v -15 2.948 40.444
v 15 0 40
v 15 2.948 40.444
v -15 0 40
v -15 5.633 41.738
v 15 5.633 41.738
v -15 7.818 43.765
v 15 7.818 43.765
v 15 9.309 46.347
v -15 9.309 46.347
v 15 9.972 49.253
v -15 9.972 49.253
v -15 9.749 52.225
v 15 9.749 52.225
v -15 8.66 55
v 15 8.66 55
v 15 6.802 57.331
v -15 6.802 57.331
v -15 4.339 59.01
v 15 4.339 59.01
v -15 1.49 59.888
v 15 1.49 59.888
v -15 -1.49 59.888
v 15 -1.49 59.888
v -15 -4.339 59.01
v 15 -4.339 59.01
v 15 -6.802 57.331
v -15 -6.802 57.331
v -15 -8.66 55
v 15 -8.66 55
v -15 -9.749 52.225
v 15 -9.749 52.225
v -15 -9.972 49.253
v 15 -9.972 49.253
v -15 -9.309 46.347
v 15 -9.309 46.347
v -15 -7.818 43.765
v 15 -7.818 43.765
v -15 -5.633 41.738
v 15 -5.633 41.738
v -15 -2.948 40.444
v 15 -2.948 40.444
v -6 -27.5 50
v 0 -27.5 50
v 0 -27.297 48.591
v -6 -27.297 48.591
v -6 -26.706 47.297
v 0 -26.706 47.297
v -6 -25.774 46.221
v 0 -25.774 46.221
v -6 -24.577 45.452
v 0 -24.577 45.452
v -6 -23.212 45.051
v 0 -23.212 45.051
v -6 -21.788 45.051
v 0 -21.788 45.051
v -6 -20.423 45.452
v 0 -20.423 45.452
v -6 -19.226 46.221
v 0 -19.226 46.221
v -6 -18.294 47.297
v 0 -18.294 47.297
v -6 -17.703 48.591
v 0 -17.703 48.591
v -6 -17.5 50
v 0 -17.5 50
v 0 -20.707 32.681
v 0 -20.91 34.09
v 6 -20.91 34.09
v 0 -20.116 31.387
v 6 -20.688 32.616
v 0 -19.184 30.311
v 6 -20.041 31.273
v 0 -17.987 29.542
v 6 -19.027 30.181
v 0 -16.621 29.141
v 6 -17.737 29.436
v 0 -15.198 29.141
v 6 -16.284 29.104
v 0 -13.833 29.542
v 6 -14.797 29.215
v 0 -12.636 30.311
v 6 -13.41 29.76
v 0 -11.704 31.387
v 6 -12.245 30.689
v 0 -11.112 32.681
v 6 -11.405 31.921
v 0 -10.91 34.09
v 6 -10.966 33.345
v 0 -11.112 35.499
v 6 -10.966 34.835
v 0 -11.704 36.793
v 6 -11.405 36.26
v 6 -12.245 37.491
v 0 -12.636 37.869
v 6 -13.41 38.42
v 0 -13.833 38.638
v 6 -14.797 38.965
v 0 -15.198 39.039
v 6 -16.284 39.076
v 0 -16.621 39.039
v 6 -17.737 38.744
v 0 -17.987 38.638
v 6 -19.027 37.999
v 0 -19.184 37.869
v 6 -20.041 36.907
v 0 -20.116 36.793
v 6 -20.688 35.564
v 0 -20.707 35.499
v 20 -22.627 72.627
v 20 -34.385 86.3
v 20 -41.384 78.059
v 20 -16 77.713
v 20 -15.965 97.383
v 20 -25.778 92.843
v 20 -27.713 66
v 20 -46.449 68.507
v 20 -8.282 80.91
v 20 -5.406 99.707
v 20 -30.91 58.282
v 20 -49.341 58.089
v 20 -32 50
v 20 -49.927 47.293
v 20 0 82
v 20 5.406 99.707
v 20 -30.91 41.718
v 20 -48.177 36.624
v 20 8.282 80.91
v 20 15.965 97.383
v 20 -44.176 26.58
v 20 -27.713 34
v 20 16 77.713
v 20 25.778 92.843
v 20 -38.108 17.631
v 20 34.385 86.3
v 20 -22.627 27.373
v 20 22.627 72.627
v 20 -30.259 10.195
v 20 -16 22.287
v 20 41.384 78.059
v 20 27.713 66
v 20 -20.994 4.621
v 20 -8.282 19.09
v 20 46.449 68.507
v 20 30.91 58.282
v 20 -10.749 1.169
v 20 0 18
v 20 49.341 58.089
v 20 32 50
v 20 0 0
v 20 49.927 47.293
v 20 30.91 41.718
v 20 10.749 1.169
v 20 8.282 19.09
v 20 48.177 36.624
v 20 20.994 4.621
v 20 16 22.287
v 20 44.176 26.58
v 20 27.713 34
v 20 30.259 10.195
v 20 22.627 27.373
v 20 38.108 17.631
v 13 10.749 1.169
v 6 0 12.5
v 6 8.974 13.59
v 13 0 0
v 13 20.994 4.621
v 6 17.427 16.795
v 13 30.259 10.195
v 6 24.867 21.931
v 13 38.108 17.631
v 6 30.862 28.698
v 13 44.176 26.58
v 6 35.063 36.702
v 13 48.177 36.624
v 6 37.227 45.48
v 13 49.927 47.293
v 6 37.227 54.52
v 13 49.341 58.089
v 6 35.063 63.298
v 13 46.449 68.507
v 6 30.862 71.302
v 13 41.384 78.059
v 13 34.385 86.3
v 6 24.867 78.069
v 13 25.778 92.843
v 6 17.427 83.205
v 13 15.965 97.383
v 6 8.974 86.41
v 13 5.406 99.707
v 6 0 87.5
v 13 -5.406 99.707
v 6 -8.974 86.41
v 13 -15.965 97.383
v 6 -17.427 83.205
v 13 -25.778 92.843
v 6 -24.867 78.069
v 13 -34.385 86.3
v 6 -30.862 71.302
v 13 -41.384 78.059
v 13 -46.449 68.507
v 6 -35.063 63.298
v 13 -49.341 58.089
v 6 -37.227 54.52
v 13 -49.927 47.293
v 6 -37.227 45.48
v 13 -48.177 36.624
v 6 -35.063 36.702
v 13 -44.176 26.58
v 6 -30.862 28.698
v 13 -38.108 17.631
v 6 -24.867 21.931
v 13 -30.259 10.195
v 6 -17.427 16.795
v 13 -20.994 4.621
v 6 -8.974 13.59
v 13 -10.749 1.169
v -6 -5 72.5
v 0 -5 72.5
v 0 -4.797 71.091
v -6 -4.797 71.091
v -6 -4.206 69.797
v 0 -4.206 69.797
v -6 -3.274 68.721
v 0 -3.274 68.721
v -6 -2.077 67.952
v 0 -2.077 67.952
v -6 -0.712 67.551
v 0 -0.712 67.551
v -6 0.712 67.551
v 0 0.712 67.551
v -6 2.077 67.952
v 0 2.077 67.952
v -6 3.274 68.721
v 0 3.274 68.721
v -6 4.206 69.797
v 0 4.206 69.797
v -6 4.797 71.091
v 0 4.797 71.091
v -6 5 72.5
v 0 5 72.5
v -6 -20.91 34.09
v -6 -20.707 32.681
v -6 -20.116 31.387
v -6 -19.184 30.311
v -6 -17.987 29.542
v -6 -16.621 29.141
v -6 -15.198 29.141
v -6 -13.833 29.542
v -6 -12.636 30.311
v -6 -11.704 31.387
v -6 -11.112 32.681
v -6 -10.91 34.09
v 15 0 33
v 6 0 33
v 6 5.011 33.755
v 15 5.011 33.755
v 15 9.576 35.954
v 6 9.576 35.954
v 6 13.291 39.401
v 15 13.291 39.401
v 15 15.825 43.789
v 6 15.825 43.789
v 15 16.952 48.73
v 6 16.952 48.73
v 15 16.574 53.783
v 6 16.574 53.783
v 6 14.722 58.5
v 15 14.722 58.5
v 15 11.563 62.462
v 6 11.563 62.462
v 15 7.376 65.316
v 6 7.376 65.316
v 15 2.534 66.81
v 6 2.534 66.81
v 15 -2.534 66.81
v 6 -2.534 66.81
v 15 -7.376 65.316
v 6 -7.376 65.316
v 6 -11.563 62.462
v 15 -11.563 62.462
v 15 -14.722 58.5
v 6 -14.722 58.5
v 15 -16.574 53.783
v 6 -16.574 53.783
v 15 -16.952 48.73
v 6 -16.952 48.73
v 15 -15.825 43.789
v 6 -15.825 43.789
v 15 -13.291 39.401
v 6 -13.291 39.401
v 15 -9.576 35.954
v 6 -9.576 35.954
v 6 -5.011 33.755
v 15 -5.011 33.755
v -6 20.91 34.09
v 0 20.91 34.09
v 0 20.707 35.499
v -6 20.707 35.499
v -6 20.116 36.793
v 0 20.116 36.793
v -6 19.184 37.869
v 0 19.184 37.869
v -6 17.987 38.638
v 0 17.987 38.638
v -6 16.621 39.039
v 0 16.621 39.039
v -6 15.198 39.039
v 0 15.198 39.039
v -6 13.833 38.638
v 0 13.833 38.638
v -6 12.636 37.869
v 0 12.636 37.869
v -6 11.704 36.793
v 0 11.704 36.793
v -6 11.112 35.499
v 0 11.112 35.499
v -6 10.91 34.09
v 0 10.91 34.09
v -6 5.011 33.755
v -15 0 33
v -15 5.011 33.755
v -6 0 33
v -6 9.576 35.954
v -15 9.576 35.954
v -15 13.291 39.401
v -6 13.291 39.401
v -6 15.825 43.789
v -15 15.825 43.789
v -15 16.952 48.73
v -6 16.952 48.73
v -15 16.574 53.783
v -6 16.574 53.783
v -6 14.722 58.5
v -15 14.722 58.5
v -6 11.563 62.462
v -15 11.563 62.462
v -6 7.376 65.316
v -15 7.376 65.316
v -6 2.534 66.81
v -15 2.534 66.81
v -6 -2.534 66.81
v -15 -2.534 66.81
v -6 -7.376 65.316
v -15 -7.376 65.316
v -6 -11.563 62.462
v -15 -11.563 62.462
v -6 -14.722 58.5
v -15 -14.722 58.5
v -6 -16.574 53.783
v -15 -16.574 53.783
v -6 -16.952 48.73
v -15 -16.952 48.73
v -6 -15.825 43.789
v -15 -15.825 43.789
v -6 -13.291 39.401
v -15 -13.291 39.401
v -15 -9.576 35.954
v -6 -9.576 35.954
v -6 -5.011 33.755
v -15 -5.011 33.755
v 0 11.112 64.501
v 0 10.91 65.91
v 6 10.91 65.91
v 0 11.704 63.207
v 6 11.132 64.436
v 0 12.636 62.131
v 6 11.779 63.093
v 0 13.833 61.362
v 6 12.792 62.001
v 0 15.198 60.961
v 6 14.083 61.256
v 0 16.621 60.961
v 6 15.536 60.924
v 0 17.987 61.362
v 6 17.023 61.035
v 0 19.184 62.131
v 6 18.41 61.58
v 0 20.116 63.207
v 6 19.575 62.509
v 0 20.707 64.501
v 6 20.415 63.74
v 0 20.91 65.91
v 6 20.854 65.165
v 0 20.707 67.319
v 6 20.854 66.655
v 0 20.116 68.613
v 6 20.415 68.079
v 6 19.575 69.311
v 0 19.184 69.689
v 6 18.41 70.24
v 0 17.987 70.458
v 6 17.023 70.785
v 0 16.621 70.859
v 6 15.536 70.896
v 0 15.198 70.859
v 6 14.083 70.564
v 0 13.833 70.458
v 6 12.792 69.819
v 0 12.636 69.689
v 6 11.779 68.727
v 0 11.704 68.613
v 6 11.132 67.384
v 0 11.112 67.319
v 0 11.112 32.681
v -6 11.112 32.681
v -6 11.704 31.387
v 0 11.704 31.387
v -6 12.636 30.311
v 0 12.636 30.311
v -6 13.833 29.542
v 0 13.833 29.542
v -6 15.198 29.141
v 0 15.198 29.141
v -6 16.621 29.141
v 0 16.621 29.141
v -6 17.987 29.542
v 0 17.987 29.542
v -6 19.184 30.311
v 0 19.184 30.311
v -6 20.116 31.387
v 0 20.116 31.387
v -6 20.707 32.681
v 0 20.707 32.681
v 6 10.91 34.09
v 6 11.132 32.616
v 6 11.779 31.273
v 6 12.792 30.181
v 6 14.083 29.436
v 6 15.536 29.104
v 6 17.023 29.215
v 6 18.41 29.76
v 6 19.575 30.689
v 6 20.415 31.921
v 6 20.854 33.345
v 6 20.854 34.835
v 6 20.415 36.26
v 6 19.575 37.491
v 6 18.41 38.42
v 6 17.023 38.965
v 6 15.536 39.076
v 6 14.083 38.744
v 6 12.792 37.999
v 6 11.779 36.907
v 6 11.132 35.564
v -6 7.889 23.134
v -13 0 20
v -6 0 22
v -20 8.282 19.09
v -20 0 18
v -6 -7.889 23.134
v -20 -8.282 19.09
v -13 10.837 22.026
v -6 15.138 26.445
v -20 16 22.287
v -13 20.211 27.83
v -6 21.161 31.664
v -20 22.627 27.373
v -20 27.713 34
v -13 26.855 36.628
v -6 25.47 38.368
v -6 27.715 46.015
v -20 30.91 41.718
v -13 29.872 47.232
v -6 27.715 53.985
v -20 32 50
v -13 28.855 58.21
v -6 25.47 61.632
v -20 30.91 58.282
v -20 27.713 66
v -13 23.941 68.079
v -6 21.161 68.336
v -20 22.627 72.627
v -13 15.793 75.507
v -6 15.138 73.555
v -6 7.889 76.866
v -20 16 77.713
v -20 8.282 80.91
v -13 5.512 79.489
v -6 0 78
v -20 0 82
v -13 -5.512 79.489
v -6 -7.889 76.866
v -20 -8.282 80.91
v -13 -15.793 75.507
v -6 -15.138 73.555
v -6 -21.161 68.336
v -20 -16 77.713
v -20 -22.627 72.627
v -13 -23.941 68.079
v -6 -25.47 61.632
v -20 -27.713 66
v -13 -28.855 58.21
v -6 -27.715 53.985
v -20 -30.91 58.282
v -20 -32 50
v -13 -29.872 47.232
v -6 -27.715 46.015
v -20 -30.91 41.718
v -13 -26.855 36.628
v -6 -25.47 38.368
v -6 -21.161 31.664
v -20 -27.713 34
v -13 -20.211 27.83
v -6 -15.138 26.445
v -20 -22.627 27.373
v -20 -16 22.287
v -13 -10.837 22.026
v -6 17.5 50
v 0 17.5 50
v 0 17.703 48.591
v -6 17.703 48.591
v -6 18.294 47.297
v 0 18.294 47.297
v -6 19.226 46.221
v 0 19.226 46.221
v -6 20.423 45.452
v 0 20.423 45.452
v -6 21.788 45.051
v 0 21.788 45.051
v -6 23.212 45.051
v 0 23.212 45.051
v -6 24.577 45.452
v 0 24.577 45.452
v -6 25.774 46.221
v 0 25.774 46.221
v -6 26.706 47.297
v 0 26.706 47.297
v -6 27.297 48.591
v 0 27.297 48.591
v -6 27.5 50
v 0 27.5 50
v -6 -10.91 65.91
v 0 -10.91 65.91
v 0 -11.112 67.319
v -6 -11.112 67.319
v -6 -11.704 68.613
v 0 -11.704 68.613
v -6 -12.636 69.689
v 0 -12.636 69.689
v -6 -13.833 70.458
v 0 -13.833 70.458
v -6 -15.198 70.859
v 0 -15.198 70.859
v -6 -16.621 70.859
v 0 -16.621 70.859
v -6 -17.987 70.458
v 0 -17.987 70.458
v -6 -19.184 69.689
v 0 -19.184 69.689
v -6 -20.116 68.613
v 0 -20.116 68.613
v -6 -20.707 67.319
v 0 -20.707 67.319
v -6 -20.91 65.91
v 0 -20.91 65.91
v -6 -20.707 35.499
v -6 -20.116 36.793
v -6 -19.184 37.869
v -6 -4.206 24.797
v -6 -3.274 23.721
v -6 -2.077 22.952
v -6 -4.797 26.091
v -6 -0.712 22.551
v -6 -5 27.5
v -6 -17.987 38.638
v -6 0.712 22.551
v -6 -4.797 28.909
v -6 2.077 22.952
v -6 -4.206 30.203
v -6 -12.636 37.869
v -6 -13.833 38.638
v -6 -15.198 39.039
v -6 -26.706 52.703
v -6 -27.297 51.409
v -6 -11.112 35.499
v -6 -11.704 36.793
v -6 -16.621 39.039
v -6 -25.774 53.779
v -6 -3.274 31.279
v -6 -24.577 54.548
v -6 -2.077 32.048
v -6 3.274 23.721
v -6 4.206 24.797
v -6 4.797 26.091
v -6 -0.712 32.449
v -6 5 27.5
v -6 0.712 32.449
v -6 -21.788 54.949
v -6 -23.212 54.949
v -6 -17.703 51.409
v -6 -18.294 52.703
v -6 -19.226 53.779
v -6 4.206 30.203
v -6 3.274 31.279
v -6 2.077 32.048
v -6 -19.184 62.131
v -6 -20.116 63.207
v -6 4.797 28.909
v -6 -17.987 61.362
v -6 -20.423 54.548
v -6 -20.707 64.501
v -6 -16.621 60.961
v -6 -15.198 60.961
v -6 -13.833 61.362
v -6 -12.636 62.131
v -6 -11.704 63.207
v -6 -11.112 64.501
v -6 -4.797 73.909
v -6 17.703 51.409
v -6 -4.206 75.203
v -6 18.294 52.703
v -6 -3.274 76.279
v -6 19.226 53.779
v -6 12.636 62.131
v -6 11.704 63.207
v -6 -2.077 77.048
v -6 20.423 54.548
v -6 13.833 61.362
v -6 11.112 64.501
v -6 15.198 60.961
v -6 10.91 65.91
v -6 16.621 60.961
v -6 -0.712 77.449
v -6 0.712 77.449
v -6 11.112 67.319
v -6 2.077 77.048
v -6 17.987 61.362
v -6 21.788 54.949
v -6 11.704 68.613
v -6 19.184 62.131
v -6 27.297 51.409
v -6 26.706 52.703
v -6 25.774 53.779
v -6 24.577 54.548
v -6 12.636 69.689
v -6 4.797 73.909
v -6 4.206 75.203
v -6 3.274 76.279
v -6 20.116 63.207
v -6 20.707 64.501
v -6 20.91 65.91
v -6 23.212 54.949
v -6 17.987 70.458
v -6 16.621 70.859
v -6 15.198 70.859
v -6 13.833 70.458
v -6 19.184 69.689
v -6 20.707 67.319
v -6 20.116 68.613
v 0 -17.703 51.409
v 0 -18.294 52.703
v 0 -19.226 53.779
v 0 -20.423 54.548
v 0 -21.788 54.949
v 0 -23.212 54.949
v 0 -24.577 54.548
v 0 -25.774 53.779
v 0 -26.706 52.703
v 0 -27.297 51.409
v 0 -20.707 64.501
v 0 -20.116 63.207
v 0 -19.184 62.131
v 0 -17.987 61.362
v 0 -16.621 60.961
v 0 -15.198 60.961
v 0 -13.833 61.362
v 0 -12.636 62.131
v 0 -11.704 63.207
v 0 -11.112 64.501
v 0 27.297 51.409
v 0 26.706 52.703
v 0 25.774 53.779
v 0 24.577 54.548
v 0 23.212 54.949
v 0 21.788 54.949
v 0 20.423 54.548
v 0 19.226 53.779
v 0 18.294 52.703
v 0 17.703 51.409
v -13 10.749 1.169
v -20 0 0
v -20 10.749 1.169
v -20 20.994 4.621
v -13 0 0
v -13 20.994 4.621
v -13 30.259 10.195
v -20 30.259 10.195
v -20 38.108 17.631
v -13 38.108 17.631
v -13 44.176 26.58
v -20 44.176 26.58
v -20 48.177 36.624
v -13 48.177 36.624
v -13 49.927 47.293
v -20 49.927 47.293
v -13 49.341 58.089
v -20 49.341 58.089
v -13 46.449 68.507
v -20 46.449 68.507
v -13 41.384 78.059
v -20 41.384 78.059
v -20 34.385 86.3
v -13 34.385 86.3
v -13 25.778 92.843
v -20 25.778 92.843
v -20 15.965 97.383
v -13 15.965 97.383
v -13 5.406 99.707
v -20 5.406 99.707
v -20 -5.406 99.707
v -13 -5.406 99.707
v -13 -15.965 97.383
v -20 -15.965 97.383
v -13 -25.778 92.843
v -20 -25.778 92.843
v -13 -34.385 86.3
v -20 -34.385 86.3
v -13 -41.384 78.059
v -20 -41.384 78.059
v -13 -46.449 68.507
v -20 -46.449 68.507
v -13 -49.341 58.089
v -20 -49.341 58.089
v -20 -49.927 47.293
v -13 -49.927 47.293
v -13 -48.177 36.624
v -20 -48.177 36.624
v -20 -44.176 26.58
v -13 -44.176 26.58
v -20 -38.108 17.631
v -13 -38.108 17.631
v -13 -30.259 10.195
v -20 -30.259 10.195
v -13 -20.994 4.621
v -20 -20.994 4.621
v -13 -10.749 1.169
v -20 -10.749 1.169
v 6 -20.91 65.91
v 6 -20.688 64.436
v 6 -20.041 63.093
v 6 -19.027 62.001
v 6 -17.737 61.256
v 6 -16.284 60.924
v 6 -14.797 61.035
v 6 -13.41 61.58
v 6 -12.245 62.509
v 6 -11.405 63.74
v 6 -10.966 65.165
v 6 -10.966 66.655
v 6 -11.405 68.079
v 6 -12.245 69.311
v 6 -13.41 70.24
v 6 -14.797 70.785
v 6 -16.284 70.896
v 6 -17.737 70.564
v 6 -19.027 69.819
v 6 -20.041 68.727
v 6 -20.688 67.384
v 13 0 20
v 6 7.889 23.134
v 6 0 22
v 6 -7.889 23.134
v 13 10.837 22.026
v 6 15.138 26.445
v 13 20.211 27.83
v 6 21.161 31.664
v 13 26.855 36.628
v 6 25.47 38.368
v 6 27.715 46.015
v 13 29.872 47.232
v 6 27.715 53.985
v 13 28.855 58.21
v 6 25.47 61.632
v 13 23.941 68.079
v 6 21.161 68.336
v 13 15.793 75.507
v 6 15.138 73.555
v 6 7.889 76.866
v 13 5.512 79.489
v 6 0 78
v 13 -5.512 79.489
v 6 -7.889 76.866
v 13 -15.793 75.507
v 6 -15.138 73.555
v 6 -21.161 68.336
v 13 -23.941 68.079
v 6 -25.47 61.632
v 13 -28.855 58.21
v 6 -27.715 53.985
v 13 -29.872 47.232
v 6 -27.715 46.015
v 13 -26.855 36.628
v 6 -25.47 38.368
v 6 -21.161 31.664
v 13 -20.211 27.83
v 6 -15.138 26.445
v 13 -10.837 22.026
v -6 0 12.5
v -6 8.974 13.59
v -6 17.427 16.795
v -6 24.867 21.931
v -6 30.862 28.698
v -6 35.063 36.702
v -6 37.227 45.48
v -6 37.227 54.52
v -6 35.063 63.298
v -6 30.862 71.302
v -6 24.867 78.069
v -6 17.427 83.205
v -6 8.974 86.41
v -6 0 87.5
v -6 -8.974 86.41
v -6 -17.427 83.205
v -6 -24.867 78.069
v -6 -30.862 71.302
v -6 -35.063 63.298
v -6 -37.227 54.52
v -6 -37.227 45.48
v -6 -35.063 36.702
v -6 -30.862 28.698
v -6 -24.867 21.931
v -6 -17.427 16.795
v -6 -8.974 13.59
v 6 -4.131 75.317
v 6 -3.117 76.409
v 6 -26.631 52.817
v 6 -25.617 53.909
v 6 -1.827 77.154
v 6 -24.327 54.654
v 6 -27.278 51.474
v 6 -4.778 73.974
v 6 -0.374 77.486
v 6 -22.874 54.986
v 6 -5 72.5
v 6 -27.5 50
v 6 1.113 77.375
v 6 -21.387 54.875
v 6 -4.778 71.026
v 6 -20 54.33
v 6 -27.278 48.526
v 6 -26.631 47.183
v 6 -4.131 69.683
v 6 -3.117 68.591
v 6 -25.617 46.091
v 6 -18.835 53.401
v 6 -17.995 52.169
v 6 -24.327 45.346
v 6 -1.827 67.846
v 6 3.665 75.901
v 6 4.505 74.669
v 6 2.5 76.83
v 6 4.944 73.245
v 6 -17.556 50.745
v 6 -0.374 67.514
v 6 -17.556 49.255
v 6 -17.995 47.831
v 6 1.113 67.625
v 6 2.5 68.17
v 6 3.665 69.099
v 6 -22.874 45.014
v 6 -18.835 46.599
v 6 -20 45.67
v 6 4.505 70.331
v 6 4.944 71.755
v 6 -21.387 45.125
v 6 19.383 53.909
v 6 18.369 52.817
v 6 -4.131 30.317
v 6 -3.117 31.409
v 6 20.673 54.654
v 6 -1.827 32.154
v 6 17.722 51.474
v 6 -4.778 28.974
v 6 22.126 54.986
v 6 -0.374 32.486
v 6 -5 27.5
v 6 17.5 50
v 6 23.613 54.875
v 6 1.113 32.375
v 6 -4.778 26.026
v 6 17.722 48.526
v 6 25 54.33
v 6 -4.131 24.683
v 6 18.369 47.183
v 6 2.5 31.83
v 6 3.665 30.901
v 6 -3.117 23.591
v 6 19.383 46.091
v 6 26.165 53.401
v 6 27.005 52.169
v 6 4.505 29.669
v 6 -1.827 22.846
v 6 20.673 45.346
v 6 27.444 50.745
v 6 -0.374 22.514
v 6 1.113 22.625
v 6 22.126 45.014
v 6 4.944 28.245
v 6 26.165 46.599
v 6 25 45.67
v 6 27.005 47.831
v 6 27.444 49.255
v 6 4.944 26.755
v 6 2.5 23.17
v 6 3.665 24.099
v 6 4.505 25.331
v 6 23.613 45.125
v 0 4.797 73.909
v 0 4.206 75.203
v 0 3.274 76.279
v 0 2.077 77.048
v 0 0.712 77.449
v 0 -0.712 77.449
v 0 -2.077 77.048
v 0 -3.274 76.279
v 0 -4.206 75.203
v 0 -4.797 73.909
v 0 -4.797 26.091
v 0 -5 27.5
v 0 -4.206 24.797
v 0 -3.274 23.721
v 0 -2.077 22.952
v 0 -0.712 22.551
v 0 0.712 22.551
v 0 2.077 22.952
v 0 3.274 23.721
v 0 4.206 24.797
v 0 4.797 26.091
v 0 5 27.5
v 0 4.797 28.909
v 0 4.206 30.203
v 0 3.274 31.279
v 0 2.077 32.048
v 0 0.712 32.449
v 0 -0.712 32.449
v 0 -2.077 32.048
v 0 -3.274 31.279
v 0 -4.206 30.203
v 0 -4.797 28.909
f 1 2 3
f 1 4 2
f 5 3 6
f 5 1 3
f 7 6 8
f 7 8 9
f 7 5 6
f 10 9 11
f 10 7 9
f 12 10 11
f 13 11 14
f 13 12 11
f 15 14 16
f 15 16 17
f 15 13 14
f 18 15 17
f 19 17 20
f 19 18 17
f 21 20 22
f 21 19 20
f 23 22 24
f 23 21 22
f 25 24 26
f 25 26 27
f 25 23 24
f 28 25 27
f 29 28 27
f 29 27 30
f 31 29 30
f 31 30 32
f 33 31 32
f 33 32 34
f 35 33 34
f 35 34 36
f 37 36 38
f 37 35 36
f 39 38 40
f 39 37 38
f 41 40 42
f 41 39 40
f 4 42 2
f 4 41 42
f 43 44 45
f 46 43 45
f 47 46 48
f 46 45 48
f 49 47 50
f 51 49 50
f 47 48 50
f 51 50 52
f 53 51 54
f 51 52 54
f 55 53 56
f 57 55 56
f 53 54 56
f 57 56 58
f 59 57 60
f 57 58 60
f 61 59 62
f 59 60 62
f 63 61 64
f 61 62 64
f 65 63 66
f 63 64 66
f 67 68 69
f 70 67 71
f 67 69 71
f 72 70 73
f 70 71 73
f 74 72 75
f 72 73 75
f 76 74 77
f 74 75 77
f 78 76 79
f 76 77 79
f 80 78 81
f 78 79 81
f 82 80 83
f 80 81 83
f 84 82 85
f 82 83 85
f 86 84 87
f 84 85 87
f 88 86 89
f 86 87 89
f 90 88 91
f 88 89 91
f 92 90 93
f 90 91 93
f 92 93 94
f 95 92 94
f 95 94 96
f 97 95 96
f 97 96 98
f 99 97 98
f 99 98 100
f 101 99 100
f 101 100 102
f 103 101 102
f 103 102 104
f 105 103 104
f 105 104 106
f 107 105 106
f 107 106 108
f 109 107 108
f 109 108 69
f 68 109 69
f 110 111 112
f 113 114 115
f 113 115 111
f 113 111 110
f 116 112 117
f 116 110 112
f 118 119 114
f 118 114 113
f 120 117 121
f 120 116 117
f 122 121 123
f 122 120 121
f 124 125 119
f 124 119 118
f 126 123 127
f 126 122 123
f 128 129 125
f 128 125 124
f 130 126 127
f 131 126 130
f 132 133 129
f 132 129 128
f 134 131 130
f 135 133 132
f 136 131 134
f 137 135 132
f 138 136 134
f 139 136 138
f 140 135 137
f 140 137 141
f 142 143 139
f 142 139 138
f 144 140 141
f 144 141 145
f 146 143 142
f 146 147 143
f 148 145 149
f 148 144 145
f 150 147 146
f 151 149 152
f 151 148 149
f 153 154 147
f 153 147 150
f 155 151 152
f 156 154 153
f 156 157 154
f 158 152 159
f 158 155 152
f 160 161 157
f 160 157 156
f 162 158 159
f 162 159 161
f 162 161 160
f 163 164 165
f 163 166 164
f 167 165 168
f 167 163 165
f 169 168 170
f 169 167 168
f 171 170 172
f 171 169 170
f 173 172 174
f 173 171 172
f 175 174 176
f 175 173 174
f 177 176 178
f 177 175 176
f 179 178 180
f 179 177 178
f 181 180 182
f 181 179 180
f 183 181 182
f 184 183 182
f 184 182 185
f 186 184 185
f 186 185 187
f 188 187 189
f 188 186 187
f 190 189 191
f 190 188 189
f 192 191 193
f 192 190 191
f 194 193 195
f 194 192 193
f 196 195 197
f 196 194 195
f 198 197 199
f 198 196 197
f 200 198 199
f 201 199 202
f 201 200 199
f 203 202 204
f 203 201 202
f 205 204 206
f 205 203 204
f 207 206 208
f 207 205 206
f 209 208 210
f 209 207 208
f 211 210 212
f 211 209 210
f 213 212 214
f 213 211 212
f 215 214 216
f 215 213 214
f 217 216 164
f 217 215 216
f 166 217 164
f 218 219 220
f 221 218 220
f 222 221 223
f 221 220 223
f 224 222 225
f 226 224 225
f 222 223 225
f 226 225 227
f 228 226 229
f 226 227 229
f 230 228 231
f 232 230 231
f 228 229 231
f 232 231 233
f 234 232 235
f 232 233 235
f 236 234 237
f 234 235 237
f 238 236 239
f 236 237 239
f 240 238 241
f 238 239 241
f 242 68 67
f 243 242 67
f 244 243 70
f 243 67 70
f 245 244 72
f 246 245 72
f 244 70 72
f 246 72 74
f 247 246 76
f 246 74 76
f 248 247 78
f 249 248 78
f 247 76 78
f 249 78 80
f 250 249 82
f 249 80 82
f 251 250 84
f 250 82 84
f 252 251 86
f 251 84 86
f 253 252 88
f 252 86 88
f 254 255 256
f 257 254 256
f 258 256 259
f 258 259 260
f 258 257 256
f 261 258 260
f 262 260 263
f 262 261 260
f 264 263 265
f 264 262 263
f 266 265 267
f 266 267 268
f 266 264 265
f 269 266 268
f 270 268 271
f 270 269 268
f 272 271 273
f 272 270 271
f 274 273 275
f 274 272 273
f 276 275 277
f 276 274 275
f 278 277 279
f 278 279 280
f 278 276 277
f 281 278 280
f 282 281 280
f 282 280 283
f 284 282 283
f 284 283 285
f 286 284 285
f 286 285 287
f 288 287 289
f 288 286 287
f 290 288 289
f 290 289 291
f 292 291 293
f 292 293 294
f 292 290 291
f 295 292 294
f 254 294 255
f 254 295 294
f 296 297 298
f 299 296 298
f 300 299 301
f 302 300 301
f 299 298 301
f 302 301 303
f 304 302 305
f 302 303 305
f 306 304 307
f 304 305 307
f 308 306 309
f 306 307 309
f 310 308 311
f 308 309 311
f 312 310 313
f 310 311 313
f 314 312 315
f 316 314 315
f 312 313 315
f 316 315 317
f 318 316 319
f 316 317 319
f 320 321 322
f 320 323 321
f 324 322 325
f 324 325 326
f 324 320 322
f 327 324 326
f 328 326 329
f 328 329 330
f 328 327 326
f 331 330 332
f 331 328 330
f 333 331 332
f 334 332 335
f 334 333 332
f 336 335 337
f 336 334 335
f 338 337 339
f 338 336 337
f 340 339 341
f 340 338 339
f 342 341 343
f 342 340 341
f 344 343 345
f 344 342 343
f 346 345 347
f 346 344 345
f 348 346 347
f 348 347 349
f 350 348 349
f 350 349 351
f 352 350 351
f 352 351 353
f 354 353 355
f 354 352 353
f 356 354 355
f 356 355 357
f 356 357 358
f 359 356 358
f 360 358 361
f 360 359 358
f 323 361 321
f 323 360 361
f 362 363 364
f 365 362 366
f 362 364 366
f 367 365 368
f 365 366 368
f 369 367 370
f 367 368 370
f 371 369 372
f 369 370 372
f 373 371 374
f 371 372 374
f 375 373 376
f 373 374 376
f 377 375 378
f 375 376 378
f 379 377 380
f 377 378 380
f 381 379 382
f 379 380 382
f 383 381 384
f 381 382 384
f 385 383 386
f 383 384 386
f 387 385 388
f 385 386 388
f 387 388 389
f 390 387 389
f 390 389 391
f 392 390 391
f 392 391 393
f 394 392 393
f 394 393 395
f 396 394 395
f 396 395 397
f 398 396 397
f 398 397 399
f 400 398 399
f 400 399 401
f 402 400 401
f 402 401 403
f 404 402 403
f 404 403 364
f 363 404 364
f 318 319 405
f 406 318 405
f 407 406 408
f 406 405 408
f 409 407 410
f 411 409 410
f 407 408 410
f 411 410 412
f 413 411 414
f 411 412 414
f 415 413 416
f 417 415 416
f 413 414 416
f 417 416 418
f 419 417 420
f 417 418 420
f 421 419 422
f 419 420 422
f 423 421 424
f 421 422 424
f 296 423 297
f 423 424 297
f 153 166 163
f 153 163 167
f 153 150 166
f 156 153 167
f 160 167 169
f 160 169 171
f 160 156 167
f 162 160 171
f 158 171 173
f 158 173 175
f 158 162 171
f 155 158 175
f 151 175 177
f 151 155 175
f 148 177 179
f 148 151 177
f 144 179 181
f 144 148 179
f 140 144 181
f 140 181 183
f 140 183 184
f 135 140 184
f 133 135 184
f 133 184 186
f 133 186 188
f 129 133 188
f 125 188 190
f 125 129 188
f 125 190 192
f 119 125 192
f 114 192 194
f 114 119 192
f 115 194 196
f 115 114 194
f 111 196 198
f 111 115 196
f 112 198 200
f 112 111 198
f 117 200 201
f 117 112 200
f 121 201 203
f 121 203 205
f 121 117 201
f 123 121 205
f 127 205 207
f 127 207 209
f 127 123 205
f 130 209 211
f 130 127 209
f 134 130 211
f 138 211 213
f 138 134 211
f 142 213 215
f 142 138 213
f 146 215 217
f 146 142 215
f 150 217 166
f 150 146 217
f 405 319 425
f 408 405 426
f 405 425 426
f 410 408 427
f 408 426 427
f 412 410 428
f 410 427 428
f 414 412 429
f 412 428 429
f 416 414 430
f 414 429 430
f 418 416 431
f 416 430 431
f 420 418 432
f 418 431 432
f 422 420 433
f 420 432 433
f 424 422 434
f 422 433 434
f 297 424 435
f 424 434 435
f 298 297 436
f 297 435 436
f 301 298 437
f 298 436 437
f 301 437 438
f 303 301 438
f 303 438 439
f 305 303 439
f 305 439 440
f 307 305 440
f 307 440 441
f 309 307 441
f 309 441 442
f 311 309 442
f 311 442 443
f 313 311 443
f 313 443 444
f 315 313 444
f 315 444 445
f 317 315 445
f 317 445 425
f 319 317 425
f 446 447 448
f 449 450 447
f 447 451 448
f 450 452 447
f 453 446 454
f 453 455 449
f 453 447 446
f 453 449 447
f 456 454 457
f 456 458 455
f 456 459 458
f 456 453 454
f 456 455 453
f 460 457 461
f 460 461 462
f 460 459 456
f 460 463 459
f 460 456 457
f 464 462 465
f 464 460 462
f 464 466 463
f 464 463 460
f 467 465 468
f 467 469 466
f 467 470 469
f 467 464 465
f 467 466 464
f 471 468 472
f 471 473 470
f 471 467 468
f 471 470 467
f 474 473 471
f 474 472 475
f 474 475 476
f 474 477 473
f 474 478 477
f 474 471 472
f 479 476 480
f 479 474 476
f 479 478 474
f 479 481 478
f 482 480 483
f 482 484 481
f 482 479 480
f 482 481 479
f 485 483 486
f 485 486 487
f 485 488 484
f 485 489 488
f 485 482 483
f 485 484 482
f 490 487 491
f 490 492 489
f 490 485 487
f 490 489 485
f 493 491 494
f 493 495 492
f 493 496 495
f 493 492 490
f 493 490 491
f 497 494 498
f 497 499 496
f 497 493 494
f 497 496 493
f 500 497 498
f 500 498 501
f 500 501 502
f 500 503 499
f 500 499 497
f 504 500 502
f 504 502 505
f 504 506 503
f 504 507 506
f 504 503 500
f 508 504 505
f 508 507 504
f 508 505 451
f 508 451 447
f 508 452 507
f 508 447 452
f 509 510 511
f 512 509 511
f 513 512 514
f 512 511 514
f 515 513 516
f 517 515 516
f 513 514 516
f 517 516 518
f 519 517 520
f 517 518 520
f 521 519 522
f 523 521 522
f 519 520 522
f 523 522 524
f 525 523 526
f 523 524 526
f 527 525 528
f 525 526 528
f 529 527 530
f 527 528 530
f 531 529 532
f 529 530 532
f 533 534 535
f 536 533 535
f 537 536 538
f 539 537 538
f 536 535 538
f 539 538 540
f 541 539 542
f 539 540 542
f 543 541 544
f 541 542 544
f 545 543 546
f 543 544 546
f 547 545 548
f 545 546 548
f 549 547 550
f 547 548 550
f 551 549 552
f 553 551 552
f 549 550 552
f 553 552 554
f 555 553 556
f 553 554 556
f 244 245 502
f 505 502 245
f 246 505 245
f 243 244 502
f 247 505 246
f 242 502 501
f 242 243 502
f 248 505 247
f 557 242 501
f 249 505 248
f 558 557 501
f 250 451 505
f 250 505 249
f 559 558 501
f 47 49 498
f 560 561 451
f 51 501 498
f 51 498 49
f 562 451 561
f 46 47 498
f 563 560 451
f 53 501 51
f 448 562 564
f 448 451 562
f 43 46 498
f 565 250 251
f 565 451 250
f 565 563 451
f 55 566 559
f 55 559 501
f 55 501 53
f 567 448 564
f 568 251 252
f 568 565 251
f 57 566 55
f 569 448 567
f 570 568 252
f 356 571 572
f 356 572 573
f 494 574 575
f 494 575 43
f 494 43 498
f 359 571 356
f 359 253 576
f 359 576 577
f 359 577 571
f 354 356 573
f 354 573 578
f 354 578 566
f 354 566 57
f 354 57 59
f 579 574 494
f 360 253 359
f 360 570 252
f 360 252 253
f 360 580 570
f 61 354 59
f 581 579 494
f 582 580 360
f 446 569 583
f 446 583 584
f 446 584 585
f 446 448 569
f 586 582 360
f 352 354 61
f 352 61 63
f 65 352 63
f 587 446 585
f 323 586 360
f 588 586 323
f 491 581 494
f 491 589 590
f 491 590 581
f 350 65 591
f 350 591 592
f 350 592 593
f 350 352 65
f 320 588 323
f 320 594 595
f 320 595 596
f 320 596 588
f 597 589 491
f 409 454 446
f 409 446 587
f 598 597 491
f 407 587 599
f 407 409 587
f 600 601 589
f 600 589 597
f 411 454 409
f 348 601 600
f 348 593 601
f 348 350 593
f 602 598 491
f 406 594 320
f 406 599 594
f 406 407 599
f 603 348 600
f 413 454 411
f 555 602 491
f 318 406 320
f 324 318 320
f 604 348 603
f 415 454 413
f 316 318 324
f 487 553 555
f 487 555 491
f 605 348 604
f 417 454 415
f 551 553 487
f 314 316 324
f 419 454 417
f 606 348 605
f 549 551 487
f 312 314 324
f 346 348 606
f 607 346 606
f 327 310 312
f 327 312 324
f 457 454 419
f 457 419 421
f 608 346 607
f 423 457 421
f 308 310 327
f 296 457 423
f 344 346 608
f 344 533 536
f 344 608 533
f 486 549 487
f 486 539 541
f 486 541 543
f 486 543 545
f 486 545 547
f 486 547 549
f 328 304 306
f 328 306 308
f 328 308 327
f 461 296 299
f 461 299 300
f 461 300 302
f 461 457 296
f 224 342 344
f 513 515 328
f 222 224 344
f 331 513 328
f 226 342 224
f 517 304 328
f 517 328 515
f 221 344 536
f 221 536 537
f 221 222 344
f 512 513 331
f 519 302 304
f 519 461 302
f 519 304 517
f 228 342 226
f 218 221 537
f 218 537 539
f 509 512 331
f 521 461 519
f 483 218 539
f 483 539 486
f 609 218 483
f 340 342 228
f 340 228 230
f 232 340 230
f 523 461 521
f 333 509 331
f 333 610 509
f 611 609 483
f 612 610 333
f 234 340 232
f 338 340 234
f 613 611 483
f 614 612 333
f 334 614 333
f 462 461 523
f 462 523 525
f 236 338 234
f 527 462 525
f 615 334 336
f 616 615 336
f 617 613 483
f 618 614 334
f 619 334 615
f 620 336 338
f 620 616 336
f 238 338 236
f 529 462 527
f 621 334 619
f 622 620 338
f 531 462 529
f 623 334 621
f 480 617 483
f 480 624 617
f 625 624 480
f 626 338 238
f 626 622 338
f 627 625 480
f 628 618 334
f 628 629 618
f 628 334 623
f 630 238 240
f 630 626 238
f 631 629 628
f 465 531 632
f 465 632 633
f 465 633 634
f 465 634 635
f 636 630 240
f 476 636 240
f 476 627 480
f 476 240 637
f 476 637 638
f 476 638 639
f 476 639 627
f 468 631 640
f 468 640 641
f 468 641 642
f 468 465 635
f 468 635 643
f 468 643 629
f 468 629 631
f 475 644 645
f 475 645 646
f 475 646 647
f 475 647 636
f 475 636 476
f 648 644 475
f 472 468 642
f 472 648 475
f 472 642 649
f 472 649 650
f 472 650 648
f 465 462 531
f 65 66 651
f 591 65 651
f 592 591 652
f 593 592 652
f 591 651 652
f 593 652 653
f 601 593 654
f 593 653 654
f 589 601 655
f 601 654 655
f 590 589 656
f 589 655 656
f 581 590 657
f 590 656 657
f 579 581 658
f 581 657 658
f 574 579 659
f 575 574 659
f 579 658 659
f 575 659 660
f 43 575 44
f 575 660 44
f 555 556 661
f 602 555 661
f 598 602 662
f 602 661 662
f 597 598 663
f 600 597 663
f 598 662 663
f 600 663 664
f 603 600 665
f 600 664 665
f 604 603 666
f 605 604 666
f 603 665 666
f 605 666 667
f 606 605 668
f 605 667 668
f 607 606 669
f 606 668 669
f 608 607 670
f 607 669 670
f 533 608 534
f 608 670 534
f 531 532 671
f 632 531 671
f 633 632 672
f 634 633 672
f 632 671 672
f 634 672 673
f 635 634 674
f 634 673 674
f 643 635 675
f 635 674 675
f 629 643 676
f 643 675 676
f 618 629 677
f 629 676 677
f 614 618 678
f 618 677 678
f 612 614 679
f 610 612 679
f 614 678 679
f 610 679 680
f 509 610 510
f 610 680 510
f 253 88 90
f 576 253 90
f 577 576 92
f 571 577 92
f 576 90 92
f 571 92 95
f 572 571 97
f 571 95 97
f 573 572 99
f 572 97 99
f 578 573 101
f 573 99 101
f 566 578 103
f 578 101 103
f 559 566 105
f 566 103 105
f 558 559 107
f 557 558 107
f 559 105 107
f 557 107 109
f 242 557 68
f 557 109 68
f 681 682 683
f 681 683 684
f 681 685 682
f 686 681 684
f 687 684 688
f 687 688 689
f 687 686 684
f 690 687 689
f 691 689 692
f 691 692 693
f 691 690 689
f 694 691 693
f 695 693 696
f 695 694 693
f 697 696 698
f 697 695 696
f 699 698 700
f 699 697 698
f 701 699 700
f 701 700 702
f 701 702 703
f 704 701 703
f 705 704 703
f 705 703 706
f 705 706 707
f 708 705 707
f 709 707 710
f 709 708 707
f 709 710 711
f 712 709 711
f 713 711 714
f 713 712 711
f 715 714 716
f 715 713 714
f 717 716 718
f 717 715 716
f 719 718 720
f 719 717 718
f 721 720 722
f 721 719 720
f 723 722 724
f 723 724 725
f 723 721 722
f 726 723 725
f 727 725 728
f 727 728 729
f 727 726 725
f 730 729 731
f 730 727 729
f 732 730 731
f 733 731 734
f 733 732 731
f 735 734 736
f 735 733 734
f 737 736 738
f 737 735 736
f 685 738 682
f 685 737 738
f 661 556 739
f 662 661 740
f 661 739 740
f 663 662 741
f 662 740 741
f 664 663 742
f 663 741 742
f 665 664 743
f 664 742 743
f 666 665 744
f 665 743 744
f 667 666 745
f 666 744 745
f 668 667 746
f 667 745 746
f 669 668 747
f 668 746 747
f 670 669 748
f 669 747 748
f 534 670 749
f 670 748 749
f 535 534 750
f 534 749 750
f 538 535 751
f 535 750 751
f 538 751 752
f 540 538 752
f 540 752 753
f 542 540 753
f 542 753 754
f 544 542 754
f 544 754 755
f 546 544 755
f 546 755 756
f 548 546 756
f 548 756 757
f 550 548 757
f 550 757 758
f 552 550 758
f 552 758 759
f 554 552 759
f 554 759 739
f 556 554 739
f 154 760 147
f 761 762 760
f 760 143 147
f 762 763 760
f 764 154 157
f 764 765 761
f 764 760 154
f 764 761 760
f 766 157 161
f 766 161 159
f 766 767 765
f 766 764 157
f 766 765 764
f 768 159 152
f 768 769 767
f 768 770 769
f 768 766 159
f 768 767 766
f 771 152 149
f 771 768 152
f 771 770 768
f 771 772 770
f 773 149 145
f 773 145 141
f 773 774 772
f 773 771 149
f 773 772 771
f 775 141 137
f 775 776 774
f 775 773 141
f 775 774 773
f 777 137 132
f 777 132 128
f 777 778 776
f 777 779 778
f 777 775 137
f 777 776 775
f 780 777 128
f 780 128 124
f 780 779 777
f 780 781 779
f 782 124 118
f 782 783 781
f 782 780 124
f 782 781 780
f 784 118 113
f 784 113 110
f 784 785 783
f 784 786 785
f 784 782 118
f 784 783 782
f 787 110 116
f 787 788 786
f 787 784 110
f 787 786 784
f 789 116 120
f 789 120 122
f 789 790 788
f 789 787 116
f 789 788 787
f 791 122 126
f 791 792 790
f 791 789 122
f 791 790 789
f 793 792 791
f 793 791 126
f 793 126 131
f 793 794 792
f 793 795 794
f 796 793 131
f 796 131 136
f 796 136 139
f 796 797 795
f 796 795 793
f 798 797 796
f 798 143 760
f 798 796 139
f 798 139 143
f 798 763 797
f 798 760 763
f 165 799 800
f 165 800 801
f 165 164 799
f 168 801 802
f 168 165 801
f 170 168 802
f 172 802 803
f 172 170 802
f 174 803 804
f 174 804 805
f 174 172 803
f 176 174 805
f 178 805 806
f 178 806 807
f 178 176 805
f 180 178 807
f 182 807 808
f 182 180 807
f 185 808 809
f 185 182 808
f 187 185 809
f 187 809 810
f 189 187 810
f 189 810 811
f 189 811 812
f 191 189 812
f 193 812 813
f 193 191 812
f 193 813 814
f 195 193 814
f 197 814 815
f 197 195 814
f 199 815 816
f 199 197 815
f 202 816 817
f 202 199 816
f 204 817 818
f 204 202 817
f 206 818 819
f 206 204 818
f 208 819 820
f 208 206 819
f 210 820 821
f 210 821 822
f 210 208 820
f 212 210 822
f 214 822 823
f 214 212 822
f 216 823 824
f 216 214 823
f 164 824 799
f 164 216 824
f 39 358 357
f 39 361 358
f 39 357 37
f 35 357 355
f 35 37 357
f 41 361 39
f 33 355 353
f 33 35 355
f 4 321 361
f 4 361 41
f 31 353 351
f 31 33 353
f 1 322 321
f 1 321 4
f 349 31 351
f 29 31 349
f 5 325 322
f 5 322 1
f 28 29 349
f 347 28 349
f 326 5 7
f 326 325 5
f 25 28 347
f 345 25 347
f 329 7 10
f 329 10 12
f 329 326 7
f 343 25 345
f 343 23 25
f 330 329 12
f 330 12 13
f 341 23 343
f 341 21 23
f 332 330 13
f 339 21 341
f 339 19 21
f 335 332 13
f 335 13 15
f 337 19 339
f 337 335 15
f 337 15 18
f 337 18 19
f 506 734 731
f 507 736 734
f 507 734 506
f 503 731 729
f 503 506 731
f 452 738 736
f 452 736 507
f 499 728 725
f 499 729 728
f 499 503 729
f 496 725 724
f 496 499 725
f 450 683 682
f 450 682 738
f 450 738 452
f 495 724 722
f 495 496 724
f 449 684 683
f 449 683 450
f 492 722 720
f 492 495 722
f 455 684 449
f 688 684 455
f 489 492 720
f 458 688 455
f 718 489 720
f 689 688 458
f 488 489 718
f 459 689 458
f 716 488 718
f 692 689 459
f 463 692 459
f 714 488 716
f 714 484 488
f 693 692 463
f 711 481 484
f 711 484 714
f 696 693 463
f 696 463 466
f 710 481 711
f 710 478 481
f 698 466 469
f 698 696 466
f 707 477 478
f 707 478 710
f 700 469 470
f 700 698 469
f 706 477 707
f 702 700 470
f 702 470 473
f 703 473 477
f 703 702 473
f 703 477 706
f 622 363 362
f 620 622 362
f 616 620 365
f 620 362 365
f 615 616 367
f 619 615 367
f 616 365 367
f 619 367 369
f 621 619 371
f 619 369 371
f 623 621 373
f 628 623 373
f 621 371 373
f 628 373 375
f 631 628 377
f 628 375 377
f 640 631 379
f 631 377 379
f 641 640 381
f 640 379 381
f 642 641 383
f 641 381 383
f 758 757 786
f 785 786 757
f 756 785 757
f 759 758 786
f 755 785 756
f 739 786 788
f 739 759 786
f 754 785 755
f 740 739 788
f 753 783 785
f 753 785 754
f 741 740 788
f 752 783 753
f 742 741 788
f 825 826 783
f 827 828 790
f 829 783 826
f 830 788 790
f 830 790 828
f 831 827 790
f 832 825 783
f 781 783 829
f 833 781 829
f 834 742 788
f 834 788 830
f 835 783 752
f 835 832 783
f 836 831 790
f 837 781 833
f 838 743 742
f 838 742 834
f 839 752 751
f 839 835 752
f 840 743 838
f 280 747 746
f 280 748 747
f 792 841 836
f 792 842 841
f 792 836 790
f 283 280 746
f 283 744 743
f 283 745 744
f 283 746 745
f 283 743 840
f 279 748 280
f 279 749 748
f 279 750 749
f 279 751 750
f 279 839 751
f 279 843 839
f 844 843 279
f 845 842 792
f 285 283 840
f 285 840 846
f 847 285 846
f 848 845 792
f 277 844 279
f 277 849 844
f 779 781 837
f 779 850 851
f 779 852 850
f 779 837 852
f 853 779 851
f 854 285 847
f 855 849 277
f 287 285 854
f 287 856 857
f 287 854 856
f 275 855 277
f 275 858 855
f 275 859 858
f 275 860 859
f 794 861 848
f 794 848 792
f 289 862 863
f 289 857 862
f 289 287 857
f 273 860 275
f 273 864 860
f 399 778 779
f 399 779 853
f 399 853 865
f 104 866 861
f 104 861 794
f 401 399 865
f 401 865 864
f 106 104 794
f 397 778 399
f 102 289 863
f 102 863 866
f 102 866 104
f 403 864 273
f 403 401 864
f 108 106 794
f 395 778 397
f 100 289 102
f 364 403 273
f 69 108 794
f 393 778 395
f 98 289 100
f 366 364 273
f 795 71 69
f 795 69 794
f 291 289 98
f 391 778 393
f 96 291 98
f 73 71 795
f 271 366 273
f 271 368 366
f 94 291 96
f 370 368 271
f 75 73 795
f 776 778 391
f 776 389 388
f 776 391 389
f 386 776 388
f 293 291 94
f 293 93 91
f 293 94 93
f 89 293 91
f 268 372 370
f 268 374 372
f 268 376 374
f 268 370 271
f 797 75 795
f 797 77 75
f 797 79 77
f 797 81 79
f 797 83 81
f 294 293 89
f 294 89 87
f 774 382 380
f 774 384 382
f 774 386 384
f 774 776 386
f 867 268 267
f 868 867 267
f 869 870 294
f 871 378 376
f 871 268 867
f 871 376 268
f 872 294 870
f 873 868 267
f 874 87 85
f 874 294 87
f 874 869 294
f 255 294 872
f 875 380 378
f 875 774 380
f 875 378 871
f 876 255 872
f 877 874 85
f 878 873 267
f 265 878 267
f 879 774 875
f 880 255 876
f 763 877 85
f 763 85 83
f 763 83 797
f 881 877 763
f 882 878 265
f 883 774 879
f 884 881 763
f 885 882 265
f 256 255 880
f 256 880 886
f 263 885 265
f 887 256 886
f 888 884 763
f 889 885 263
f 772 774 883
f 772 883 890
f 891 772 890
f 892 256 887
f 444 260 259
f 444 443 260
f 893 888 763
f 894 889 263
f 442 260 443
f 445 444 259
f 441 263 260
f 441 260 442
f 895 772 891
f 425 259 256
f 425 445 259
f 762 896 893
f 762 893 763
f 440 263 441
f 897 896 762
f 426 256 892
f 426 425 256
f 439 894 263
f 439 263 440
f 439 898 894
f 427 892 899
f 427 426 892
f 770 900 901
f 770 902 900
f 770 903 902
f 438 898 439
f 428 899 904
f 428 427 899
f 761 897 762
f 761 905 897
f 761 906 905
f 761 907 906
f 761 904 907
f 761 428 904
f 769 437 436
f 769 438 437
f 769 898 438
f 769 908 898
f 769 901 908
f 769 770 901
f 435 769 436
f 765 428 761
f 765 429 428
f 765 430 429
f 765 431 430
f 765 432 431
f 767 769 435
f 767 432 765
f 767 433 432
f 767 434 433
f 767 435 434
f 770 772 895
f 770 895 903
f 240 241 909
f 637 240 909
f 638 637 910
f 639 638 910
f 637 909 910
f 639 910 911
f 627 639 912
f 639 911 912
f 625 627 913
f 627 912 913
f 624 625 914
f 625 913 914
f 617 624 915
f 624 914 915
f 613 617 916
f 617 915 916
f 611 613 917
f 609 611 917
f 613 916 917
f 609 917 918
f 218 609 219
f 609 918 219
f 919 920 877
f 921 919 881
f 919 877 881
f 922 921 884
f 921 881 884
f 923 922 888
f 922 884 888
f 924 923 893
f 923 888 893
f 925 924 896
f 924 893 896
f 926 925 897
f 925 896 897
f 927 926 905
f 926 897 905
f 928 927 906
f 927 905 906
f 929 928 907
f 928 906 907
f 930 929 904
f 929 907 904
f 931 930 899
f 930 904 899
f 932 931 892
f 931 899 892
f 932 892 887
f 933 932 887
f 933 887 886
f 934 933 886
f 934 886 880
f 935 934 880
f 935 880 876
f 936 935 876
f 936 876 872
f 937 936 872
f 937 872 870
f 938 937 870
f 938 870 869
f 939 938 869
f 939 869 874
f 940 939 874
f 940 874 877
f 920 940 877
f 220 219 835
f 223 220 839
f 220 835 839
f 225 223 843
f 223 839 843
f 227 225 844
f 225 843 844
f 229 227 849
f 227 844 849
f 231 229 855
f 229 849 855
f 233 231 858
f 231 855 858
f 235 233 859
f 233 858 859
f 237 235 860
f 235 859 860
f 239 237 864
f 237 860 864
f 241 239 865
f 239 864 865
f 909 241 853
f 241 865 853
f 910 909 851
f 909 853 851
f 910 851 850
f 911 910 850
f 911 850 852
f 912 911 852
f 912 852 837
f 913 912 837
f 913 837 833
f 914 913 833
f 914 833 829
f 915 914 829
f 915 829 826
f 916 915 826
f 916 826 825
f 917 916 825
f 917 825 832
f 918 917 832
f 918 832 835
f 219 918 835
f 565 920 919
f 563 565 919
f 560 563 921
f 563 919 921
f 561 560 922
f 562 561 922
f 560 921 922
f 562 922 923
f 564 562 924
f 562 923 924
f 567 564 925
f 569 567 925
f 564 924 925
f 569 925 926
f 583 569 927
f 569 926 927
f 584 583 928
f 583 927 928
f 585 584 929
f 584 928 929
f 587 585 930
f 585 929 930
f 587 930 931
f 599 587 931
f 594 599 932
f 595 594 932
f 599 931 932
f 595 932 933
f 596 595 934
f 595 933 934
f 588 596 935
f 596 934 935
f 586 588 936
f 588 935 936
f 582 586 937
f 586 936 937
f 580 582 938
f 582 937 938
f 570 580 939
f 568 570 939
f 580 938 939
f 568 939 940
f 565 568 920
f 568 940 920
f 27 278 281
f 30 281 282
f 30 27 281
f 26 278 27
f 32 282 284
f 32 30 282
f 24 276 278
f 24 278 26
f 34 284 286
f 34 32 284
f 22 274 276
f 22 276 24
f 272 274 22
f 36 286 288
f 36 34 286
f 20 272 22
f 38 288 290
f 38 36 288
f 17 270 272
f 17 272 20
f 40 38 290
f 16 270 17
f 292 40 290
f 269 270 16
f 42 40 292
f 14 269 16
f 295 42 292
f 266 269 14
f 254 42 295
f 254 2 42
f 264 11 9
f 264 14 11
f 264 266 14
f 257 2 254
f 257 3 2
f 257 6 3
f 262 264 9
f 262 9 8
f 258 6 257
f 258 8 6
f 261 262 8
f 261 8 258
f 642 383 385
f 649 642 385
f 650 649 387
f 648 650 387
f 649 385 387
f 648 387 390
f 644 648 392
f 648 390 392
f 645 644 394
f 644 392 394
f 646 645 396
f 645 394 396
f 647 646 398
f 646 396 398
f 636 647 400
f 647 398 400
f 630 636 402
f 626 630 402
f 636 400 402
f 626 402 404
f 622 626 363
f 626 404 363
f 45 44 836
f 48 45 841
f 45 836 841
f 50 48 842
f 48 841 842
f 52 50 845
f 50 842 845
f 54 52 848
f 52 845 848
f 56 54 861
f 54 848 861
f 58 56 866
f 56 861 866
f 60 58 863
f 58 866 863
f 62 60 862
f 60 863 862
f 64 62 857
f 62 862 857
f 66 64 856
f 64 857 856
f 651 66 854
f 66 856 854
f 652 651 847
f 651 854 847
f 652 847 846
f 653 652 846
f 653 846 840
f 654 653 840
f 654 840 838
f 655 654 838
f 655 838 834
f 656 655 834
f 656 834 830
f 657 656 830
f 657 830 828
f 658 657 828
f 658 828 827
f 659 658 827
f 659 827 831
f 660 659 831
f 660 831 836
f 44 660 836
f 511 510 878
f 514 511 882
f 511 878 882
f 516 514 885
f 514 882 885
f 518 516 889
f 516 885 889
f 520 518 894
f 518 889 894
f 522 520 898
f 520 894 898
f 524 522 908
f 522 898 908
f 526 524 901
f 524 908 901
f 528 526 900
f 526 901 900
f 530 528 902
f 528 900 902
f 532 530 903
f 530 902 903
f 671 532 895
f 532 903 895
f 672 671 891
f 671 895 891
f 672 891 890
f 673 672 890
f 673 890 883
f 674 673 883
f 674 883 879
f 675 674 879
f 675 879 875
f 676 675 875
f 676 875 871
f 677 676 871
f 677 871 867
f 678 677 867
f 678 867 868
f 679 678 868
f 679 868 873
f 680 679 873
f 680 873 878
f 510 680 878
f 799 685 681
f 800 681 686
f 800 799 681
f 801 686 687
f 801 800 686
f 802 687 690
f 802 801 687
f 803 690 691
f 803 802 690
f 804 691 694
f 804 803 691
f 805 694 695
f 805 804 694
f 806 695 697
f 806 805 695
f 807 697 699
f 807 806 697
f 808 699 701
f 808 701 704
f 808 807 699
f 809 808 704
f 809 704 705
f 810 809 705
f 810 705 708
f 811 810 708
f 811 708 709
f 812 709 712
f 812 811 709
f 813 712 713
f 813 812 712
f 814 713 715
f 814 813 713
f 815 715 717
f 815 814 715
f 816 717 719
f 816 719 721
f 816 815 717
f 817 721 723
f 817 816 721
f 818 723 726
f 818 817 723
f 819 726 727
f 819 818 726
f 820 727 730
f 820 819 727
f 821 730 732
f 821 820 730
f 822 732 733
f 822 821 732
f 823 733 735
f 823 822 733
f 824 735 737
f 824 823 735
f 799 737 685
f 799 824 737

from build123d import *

# Parameters (mm, degrees)
F3_D     = 10
F3_DEPTH = 20.001
F4_D     = 10


with BuildPart() as f1:
    # F0 (on Front) → F1 (revolve)
    with BuildSketch(Plane.XZ):
        Polygon((-20, 18), (-20, 0), (-13, 0), (-6, 12.5), (0, 12.5), (6, 12.5), (13, 0), (20, 0), (20, 18), (6, 22), (0, 22), (-6, 22), align=None)
        Polygon((-6, 33), (-6, 22), (0, 22), (6, 22), (6, 33), (0, 33), align=None)
        Polygon((-15, 33), (-6, 33), (0, 33), (6, 33), (15, 33), (15, 40), (0, 40), (-15, 40), align=None)
    revolve(axis=Axis((-4.1045919061, 0, 50), (1, 0, 0)))

    # F3 (through all, one way)
    with BuildSketch(Plane.YZ):
        with Locations((15.9099025767, 65.9099025767), (0, 72.5), (-15.9099025767, 65.9099025767), (-22.5, 50), (-15.9099025767, 34.0900974233), (0, 27.5), (15.9099025767, 34.0900974233), (22.5, 50)):
            Circle(F3_D / 2)
    extrude(amount=-F3_DEPTH, mode=Mode.SUBTRACT)

    # F4 (through all)
    with Locations(Plane(origin=(0, 0, 0), x_dir=(0, 1, 0), z_dir=(-1, 0, 0))):
        with Locations((0, -72.5), (15.9099025767, -65.9099025767), (22.5, -50), (15.9099025767, -34.0900974233), (0, -27.5), (-15.9099025767, -34.0900974233), (-22.5, -50), (-15.9099025767, -65.9099025767)):
            Hole(F4_D / 2)


solid = f1.part
